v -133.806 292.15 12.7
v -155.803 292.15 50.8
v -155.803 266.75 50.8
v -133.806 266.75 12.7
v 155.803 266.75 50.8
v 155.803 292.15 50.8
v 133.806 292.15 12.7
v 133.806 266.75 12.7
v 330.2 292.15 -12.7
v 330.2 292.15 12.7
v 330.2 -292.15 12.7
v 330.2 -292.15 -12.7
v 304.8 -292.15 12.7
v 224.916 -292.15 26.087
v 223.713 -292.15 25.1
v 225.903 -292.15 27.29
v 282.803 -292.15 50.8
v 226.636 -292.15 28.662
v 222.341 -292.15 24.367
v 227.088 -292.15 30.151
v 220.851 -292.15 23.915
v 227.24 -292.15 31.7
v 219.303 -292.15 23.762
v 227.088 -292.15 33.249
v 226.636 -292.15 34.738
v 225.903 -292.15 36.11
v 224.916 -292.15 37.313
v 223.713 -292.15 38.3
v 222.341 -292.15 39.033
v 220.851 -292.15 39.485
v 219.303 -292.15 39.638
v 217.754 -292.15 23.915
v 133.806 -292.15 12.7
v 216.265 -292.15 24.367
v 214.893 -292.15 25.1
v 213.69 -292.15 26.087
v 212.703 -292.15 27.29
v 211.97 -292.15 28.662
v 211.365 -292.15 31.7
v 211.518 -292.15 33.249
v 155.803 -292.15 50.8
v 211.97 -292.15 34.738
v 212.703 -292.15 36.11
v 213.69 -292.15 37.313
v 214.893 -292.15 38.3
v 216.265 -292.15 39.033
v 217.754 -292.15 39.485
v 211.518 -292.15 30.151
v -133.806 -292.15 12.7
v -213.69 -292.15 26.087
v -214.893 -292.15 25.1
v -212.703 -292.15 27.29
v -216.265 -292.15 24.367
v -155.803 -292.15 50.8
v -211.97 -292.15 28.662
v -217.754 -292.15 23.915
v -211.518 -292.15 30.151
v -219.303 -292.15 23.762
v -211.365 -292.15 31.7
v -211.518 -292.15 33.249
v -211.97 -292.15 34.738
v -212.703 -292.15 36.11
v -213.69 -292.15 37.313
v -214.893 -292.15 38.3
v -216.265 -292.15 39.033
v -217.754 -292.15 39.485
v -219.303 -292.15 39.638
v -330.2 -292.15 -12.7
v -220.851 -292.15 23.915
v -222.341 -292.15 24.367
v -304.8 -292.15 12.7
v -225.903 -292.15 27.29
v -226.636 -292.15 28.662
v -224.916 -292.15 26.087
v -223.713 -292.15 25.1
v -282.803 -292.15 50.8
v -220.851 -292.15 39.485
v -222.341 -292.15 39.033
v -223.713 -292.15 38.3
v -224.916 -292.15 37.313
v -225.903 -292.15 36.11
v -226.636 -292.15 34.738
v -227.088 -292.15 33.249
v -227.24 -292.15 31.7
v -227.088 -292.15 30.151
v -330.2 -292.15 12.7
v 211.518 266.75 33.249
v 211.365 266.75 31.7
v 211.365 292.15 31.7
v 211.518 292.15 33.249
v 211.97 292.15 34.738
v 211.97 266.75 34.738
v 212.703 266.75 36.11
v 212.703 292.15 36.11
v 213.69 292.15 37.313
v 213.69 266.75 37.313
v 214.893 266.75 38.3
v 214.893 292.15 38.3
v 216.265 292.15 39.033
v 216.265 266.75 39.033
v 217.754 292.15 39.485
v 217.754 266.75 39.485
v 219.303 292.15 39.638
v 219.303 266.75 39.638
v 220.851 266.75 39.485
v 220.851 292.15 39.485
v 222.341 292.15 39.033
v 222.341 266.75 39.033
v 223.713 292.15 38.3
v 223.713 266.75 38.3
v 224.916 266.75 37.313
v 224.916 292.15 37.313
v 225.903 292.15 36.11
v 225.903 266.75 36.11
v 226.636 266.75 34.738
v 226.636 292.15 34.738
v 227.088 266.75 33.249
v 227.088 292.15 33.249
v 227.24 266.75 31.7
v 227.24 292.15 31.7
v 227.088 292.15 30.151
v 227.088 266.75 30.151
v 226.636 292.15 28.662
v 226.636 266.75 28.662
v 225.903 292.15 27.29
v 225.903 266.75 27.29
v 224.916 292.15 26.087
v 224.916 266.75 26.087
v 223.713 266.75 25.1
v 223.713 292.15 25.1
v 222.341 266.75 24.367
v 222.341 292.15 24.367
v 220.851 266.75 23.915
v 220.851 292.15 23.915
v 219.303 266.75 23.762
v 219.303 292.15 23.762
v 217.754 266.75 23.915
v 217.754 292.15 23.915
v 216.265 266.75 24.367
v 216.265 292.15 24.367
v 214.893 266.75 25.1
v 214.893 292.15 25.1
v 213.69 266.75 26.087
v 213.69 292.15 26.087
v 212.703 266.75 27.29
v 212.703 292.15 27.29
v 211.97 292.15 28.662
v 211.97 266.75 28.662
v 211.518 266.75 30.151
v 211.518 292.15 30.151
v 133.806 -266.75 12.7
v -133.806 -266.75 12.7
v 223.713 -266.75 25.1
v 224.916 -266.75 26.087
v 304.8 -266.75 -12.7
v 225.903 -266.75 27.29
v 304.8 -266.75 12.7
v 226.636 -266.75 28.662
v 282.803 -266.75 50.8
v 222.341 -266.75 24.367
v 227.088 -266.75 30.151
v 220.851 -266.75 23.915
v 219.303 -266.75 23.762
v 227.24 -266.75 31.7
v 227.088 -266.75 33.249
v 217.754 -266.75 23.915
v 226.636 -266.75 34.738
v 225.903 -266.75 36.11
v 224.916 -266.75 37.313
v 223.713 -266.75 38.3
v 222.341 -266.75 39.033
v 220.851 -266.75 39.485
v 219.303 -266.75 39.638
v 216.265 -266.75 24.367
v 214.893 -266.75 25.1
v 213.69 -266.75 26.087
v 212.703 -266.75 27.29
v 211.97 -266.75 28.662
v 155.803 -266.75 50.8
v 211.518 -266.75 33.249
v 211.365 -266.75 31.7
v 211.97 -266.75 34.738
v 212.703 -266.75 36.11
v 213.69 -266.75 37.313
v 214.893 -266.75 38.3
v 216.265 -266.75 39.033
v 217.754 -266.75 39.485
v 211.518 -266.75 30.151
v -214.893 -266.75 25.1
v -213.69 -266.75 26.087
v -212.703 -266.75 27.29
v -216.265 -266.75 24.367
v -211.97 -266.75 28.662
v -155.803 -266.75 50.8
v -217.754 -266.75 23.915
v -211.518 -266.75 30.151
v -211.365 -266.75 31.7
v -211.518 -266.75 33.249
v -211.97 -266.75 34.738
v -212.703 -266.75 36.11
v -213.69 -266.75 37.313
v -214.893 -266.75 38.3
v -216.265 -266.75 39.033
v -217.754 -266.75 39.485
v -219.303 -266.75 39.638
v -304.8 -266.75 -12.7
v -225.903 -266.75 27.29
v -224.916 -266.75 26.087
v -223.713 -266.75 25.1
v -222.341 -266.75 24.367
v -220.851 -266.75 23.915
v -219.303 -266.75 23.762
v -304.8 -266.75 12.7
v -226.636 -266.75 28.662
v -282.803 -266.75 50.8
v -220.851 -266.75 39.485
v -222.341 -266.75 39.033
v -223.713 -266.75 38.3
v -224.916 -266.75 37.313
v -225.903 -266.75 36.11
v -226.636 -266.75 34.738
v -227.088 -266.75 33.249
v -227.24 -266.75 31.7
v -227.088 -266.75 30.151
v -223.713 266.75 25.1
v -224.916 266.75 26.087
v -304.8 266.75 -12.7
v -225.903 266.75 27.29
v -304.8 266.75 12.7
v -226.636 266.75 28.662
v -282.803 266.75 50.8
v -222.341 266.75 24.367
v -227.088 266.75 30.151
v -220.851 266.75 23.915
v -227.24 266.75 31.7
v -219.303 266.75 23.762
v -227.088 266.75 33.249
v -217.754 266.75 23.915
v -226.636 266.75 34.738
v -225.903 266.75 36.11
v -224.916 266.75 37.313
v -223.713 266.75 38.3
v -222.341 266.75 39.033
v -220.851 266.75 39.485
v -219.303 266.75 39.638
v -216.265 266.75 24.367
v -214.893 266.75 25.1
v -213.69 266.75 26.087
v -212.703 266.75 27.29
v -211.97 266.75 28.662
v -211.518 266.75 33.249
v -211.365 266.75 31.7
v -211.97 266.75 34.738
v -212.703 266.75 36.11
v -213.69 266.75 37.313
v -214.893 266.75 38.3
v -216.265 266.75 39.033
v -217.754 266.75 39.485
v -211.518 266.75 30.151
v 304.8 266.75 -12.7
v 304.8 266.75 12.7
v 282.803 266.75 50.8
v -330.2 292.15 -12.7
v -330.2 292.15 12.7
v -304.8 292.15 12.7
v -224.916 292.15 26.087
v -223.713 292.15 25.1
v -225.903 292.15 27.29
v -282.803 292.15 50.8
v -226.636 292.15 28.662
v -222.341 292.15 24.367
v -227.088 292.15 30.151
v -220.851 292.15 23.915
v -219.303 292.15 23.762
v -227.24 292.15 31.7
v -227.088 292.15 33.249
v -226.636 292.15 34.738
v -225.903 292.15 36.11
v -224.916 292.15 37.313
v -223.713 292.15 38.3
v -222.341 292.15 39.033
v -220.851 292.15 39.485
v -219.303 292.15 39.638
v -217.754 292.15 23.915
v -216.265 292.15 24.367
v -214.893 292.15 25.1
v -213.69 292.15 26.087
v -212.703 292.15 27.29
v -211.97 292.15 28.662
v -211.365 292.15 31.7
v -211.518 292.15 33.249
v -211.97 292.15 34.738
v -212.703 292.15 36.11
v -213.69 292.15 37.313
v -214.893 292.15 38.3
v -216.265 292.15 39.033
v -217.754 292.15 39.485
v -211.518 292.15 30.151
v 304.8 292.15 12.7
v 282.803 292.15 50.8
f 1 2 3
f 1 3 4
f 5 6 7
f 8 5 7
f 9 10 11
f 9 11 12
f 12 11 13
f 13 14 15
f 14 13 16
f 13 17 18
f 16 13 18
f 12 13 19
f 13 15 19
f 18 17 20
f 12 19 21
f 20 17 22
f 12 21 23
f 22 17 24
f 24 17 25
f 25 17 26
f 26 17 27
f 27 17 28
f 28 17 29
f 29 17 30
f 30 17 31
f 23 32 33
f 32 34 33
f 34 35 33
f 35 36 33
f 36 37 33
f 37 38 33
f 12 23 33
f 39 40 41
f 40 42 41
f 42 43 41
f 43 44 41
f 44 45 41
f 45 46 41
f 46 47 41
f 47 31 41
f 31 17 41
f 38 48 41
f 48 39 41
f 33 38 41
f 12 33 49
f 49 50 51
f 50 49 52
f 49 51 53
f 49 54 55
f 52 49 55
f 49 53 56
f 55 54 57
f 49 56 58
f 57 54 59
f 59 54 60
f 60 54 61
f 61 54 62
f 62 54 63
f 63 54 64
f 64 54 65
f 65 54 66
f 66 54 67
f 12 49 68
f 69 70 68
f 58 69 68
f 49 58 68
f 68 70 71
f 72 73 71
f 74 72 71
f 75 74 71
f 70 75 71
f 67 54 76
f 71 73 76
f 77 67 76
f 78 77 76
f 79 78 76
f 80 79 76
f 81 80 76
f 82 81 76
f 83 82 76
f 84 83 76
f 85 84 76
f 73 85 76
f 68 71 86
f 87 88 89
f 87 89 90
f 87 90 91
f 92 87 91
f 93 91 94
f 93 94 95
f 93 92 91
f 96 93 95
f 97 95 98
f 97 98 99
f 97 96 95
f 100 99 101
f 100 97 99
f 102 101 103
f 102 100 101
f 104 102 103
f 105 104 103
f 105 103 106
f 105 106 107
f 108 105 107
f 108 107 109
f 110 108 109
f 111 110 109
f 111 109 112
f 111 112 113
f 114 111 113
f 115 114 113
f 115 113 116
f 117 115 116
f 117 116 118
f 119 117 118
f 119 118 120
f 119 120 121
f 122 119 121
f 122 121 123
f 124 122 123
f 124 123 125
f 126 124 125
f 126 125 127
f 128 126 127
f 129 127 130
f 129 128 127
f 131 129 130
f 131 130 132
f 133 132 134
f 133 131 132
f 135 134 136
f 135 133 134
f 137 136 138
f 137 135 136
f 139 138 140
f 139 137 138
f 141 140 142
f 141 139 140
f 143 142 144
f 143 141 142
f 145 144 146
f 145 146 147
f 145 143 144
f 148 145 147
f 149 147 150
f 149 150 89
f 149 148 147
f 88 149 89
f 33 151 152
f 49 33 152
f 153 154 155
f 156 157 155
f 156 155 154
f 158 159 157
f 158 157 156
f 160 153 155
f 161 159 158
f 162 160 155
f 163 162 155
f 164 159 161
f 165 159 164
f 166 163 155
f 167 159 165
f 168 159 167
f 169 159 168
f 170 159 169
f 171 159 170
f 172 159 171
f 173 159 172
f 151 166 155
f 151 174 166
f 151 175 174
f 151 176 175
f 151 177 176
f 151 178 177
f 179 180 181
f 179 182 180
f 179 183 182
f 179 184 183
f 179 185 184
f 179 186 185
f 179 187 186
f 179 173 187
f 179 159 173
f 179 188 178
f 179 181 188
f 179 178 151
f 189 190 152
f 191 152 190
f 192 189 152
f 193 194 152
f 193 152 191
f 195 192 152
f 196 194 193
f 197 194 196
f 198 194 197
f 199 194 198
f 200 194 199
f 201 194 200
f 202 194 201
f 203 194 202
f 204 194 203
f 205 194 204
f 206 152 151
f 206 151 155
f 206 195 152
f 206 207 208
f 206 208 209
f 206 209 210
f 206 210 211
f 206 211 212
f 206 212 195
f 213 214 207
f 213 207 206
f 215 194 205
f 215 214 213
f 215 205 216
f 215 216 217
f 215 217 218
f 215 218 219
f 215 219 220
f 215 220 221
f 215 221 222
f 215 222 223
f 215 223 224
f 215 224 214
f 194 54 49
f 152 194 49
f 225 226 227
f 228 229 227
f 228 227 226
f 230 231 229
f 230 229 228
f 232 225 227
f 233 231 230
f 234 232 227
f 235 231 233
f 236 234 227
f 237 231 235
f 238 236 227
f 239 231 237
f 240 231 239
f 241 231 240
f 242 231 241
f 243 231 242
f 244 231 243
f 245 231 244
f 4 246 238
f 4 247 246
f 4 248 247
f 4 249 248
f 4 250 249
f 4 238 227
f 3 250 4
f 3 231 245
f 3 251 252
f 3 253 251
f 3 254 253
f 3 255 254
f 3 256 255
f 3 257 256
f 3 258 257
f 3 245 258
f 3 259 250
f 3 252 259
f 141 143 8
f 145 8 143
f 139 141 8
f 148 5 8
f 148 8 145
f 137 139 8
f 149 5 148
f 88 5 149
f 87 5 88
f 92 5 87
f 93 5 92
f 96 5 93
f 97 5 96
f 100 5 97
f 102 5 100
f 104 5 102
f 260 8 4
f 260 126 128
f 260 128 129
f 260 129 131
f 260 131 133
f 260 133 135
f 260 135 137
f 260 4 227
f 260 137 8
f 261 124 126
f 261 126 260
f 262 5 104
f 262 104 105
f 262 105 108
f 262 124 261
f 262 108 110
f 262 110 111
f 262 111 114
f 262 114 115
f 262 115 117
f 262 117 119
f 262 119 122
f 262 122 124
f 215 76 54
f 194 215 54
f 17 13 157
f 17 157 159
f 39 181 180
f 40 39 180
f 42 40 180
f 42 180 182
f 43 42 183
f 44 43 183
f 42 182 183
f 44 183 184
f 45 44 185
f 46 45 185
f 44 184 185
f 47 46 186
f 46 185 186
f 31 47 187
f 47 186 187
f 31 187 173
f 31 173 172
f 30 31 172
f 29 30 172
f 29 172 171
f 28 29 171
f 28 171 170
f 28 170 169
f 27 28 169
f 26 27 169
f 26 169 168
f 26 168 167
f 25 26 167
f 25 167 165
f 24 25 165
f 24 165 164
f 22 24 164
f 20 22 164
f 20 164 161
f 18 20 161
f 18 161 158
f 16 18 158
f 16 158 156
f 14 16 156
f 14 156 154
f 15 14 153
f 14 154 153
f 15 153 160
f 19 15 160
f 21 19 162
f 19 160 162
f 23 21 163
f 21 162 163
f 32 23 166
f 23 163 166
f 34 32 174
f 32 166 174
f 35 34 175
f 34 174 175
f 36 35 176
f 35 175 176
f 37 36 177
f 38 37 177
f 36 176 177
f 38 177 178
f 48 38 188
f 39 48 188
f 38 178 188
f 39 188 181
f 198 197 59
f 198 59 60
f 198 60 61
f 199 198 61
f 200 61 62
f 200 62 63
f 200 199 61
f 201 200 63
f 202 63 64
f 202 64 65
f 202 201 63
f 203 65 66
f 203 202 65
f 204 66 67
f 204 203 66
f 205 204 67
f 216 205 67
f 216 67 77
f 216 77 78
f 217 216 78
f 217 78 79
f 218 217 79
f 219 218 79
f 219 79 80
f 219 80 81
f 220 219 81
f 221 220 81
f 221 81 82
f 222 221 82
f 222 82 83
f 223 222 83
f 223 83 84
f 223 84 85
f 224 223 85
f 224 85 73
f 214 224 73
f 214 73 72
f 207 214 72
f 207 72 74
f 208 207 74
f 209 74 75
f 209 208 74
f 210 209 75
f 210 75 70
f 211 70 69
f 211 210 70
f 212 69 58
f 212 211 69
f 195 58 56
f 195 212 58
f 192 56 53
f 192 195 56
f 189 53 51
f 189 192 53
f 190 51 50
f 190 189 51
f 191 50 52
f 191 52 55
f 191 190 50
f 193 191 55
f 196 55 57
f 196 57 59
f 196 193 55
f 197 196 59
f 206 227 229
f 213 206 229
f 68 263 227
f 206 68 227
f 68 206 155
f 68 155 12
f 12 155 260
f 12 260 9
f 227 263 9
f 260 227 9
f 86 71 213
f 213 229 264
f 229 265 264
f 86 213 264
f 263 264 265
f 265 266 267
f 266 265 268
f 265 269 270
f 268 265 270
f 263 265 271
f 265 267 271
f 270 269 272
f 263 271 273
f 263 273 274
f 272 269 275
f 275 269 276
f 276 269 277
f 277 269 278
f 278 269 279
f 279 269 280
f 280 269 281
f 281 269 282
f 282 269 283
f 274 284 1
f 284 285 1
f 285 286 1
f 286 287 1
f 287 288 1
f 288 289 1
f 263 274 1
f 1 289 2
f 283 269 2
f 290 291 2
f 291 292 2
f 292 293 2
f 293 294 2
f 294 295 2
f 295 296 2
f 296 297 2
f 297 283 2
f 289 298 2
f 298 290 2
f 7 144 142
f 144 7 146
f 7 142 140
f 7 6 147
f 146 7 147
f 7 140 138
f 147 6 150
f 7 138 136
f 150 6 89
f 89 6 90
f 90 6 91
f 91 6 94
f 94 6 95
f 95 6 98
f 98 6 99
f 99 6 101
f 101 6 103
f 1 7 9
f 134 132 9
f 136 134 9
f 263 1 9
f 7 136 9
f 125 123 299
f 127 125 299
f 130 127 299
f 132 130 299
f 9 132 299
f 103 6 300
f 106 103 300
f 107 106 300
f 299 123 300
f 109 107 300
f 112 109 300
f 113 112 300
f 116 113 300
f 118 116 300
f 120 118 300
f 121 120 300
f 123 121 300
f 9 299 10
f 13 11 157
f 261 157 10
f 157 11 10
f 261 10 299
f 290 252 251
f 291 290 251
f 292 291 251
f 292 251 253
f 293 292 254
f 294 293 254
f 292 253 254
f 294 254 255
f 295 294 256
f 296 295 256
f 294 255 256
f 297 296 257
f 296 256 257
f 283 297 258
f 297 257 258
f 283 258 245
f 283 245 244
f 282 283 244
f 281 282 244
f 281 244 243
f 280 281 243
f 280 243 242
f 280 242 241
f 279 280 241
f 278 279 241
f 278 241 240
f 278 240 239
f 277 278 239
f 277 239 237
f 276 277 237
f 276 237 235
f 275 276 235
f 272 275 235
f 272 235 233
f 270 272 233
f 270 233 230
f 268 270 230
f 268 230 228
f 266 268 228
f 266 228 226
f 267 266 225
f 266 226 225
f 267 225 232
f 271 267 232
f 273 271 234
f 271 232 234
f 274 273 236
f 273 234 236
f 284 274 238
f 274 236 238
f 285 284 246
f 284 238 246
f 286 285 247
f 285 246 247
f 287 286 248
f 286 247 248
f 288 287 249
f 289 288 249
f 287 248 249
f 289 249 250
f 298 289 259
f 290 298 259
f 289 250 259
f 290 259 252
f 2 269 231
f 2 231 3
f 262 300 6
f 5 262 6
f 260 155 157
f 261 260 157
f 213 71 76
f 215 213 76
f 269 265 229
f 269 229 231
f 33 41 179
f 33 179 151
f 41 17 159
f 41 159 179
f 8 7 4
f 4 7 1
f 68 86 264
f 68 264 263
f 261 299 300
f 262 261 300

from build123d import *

# Parameters (mm, degrees)
F1_W     = 25.4
F1_H     = 25.4
F4_DEPTH = 25.4
F5_D     = 15.875


with BuildPart() as f2:
    # F2: sweep along a path in F0
    with BuildLine(Plane.XY) as f2_path:
        Line((-304.8, -266.75), (-304.8, 266.75))
        Line((-304.8, 266.75), (304.8, 266.75))
        Line((304.8, 266.75), (304.8, -266.75))
        Line((304.8, -266.75), (-304.8, -266.75))
    # F1 (on Front) → F2 (sweep)
    with BuildSketch(Plane.XZ):
        with Locations((-317.5, 0)):
            Rectangle(F1_W, F1_H)
    sweep(path=f2_path.line, transition=Transition.RIGHT)

    # F3 (on face) → F4 (join, through all)
    with BuildSketch(Plane.XZ.offset(292.15)):
        Polygon((133.8059094878, 12.7), (304.8, 12.7), (282.8029547439, 50.8), (155.8029547439, 50.8), align=None)
    extrude(amount=-F4_DEPTH)

    # F5 (through all)
    with Locations(Plane.XZ.offset(292.15)):
        with Locations((219.3029547439, 31.7)):
            Hole(F5_D / 2)


with BuildPart() as f6_1:
    # F6: instance of F2
    add(f2.part.mirror(Plane.YZ))


with BuildPart() as f2_1:
    add(f2.part)

    add(f6_1.part)  # F7 merges F6_1
    # F7: F6_1, F2 across plane
    add(f6_1.part.mirror(Plane.XZ))
    add(f2.part.mirror(Plane.XZ))


solid = f2_1.part
